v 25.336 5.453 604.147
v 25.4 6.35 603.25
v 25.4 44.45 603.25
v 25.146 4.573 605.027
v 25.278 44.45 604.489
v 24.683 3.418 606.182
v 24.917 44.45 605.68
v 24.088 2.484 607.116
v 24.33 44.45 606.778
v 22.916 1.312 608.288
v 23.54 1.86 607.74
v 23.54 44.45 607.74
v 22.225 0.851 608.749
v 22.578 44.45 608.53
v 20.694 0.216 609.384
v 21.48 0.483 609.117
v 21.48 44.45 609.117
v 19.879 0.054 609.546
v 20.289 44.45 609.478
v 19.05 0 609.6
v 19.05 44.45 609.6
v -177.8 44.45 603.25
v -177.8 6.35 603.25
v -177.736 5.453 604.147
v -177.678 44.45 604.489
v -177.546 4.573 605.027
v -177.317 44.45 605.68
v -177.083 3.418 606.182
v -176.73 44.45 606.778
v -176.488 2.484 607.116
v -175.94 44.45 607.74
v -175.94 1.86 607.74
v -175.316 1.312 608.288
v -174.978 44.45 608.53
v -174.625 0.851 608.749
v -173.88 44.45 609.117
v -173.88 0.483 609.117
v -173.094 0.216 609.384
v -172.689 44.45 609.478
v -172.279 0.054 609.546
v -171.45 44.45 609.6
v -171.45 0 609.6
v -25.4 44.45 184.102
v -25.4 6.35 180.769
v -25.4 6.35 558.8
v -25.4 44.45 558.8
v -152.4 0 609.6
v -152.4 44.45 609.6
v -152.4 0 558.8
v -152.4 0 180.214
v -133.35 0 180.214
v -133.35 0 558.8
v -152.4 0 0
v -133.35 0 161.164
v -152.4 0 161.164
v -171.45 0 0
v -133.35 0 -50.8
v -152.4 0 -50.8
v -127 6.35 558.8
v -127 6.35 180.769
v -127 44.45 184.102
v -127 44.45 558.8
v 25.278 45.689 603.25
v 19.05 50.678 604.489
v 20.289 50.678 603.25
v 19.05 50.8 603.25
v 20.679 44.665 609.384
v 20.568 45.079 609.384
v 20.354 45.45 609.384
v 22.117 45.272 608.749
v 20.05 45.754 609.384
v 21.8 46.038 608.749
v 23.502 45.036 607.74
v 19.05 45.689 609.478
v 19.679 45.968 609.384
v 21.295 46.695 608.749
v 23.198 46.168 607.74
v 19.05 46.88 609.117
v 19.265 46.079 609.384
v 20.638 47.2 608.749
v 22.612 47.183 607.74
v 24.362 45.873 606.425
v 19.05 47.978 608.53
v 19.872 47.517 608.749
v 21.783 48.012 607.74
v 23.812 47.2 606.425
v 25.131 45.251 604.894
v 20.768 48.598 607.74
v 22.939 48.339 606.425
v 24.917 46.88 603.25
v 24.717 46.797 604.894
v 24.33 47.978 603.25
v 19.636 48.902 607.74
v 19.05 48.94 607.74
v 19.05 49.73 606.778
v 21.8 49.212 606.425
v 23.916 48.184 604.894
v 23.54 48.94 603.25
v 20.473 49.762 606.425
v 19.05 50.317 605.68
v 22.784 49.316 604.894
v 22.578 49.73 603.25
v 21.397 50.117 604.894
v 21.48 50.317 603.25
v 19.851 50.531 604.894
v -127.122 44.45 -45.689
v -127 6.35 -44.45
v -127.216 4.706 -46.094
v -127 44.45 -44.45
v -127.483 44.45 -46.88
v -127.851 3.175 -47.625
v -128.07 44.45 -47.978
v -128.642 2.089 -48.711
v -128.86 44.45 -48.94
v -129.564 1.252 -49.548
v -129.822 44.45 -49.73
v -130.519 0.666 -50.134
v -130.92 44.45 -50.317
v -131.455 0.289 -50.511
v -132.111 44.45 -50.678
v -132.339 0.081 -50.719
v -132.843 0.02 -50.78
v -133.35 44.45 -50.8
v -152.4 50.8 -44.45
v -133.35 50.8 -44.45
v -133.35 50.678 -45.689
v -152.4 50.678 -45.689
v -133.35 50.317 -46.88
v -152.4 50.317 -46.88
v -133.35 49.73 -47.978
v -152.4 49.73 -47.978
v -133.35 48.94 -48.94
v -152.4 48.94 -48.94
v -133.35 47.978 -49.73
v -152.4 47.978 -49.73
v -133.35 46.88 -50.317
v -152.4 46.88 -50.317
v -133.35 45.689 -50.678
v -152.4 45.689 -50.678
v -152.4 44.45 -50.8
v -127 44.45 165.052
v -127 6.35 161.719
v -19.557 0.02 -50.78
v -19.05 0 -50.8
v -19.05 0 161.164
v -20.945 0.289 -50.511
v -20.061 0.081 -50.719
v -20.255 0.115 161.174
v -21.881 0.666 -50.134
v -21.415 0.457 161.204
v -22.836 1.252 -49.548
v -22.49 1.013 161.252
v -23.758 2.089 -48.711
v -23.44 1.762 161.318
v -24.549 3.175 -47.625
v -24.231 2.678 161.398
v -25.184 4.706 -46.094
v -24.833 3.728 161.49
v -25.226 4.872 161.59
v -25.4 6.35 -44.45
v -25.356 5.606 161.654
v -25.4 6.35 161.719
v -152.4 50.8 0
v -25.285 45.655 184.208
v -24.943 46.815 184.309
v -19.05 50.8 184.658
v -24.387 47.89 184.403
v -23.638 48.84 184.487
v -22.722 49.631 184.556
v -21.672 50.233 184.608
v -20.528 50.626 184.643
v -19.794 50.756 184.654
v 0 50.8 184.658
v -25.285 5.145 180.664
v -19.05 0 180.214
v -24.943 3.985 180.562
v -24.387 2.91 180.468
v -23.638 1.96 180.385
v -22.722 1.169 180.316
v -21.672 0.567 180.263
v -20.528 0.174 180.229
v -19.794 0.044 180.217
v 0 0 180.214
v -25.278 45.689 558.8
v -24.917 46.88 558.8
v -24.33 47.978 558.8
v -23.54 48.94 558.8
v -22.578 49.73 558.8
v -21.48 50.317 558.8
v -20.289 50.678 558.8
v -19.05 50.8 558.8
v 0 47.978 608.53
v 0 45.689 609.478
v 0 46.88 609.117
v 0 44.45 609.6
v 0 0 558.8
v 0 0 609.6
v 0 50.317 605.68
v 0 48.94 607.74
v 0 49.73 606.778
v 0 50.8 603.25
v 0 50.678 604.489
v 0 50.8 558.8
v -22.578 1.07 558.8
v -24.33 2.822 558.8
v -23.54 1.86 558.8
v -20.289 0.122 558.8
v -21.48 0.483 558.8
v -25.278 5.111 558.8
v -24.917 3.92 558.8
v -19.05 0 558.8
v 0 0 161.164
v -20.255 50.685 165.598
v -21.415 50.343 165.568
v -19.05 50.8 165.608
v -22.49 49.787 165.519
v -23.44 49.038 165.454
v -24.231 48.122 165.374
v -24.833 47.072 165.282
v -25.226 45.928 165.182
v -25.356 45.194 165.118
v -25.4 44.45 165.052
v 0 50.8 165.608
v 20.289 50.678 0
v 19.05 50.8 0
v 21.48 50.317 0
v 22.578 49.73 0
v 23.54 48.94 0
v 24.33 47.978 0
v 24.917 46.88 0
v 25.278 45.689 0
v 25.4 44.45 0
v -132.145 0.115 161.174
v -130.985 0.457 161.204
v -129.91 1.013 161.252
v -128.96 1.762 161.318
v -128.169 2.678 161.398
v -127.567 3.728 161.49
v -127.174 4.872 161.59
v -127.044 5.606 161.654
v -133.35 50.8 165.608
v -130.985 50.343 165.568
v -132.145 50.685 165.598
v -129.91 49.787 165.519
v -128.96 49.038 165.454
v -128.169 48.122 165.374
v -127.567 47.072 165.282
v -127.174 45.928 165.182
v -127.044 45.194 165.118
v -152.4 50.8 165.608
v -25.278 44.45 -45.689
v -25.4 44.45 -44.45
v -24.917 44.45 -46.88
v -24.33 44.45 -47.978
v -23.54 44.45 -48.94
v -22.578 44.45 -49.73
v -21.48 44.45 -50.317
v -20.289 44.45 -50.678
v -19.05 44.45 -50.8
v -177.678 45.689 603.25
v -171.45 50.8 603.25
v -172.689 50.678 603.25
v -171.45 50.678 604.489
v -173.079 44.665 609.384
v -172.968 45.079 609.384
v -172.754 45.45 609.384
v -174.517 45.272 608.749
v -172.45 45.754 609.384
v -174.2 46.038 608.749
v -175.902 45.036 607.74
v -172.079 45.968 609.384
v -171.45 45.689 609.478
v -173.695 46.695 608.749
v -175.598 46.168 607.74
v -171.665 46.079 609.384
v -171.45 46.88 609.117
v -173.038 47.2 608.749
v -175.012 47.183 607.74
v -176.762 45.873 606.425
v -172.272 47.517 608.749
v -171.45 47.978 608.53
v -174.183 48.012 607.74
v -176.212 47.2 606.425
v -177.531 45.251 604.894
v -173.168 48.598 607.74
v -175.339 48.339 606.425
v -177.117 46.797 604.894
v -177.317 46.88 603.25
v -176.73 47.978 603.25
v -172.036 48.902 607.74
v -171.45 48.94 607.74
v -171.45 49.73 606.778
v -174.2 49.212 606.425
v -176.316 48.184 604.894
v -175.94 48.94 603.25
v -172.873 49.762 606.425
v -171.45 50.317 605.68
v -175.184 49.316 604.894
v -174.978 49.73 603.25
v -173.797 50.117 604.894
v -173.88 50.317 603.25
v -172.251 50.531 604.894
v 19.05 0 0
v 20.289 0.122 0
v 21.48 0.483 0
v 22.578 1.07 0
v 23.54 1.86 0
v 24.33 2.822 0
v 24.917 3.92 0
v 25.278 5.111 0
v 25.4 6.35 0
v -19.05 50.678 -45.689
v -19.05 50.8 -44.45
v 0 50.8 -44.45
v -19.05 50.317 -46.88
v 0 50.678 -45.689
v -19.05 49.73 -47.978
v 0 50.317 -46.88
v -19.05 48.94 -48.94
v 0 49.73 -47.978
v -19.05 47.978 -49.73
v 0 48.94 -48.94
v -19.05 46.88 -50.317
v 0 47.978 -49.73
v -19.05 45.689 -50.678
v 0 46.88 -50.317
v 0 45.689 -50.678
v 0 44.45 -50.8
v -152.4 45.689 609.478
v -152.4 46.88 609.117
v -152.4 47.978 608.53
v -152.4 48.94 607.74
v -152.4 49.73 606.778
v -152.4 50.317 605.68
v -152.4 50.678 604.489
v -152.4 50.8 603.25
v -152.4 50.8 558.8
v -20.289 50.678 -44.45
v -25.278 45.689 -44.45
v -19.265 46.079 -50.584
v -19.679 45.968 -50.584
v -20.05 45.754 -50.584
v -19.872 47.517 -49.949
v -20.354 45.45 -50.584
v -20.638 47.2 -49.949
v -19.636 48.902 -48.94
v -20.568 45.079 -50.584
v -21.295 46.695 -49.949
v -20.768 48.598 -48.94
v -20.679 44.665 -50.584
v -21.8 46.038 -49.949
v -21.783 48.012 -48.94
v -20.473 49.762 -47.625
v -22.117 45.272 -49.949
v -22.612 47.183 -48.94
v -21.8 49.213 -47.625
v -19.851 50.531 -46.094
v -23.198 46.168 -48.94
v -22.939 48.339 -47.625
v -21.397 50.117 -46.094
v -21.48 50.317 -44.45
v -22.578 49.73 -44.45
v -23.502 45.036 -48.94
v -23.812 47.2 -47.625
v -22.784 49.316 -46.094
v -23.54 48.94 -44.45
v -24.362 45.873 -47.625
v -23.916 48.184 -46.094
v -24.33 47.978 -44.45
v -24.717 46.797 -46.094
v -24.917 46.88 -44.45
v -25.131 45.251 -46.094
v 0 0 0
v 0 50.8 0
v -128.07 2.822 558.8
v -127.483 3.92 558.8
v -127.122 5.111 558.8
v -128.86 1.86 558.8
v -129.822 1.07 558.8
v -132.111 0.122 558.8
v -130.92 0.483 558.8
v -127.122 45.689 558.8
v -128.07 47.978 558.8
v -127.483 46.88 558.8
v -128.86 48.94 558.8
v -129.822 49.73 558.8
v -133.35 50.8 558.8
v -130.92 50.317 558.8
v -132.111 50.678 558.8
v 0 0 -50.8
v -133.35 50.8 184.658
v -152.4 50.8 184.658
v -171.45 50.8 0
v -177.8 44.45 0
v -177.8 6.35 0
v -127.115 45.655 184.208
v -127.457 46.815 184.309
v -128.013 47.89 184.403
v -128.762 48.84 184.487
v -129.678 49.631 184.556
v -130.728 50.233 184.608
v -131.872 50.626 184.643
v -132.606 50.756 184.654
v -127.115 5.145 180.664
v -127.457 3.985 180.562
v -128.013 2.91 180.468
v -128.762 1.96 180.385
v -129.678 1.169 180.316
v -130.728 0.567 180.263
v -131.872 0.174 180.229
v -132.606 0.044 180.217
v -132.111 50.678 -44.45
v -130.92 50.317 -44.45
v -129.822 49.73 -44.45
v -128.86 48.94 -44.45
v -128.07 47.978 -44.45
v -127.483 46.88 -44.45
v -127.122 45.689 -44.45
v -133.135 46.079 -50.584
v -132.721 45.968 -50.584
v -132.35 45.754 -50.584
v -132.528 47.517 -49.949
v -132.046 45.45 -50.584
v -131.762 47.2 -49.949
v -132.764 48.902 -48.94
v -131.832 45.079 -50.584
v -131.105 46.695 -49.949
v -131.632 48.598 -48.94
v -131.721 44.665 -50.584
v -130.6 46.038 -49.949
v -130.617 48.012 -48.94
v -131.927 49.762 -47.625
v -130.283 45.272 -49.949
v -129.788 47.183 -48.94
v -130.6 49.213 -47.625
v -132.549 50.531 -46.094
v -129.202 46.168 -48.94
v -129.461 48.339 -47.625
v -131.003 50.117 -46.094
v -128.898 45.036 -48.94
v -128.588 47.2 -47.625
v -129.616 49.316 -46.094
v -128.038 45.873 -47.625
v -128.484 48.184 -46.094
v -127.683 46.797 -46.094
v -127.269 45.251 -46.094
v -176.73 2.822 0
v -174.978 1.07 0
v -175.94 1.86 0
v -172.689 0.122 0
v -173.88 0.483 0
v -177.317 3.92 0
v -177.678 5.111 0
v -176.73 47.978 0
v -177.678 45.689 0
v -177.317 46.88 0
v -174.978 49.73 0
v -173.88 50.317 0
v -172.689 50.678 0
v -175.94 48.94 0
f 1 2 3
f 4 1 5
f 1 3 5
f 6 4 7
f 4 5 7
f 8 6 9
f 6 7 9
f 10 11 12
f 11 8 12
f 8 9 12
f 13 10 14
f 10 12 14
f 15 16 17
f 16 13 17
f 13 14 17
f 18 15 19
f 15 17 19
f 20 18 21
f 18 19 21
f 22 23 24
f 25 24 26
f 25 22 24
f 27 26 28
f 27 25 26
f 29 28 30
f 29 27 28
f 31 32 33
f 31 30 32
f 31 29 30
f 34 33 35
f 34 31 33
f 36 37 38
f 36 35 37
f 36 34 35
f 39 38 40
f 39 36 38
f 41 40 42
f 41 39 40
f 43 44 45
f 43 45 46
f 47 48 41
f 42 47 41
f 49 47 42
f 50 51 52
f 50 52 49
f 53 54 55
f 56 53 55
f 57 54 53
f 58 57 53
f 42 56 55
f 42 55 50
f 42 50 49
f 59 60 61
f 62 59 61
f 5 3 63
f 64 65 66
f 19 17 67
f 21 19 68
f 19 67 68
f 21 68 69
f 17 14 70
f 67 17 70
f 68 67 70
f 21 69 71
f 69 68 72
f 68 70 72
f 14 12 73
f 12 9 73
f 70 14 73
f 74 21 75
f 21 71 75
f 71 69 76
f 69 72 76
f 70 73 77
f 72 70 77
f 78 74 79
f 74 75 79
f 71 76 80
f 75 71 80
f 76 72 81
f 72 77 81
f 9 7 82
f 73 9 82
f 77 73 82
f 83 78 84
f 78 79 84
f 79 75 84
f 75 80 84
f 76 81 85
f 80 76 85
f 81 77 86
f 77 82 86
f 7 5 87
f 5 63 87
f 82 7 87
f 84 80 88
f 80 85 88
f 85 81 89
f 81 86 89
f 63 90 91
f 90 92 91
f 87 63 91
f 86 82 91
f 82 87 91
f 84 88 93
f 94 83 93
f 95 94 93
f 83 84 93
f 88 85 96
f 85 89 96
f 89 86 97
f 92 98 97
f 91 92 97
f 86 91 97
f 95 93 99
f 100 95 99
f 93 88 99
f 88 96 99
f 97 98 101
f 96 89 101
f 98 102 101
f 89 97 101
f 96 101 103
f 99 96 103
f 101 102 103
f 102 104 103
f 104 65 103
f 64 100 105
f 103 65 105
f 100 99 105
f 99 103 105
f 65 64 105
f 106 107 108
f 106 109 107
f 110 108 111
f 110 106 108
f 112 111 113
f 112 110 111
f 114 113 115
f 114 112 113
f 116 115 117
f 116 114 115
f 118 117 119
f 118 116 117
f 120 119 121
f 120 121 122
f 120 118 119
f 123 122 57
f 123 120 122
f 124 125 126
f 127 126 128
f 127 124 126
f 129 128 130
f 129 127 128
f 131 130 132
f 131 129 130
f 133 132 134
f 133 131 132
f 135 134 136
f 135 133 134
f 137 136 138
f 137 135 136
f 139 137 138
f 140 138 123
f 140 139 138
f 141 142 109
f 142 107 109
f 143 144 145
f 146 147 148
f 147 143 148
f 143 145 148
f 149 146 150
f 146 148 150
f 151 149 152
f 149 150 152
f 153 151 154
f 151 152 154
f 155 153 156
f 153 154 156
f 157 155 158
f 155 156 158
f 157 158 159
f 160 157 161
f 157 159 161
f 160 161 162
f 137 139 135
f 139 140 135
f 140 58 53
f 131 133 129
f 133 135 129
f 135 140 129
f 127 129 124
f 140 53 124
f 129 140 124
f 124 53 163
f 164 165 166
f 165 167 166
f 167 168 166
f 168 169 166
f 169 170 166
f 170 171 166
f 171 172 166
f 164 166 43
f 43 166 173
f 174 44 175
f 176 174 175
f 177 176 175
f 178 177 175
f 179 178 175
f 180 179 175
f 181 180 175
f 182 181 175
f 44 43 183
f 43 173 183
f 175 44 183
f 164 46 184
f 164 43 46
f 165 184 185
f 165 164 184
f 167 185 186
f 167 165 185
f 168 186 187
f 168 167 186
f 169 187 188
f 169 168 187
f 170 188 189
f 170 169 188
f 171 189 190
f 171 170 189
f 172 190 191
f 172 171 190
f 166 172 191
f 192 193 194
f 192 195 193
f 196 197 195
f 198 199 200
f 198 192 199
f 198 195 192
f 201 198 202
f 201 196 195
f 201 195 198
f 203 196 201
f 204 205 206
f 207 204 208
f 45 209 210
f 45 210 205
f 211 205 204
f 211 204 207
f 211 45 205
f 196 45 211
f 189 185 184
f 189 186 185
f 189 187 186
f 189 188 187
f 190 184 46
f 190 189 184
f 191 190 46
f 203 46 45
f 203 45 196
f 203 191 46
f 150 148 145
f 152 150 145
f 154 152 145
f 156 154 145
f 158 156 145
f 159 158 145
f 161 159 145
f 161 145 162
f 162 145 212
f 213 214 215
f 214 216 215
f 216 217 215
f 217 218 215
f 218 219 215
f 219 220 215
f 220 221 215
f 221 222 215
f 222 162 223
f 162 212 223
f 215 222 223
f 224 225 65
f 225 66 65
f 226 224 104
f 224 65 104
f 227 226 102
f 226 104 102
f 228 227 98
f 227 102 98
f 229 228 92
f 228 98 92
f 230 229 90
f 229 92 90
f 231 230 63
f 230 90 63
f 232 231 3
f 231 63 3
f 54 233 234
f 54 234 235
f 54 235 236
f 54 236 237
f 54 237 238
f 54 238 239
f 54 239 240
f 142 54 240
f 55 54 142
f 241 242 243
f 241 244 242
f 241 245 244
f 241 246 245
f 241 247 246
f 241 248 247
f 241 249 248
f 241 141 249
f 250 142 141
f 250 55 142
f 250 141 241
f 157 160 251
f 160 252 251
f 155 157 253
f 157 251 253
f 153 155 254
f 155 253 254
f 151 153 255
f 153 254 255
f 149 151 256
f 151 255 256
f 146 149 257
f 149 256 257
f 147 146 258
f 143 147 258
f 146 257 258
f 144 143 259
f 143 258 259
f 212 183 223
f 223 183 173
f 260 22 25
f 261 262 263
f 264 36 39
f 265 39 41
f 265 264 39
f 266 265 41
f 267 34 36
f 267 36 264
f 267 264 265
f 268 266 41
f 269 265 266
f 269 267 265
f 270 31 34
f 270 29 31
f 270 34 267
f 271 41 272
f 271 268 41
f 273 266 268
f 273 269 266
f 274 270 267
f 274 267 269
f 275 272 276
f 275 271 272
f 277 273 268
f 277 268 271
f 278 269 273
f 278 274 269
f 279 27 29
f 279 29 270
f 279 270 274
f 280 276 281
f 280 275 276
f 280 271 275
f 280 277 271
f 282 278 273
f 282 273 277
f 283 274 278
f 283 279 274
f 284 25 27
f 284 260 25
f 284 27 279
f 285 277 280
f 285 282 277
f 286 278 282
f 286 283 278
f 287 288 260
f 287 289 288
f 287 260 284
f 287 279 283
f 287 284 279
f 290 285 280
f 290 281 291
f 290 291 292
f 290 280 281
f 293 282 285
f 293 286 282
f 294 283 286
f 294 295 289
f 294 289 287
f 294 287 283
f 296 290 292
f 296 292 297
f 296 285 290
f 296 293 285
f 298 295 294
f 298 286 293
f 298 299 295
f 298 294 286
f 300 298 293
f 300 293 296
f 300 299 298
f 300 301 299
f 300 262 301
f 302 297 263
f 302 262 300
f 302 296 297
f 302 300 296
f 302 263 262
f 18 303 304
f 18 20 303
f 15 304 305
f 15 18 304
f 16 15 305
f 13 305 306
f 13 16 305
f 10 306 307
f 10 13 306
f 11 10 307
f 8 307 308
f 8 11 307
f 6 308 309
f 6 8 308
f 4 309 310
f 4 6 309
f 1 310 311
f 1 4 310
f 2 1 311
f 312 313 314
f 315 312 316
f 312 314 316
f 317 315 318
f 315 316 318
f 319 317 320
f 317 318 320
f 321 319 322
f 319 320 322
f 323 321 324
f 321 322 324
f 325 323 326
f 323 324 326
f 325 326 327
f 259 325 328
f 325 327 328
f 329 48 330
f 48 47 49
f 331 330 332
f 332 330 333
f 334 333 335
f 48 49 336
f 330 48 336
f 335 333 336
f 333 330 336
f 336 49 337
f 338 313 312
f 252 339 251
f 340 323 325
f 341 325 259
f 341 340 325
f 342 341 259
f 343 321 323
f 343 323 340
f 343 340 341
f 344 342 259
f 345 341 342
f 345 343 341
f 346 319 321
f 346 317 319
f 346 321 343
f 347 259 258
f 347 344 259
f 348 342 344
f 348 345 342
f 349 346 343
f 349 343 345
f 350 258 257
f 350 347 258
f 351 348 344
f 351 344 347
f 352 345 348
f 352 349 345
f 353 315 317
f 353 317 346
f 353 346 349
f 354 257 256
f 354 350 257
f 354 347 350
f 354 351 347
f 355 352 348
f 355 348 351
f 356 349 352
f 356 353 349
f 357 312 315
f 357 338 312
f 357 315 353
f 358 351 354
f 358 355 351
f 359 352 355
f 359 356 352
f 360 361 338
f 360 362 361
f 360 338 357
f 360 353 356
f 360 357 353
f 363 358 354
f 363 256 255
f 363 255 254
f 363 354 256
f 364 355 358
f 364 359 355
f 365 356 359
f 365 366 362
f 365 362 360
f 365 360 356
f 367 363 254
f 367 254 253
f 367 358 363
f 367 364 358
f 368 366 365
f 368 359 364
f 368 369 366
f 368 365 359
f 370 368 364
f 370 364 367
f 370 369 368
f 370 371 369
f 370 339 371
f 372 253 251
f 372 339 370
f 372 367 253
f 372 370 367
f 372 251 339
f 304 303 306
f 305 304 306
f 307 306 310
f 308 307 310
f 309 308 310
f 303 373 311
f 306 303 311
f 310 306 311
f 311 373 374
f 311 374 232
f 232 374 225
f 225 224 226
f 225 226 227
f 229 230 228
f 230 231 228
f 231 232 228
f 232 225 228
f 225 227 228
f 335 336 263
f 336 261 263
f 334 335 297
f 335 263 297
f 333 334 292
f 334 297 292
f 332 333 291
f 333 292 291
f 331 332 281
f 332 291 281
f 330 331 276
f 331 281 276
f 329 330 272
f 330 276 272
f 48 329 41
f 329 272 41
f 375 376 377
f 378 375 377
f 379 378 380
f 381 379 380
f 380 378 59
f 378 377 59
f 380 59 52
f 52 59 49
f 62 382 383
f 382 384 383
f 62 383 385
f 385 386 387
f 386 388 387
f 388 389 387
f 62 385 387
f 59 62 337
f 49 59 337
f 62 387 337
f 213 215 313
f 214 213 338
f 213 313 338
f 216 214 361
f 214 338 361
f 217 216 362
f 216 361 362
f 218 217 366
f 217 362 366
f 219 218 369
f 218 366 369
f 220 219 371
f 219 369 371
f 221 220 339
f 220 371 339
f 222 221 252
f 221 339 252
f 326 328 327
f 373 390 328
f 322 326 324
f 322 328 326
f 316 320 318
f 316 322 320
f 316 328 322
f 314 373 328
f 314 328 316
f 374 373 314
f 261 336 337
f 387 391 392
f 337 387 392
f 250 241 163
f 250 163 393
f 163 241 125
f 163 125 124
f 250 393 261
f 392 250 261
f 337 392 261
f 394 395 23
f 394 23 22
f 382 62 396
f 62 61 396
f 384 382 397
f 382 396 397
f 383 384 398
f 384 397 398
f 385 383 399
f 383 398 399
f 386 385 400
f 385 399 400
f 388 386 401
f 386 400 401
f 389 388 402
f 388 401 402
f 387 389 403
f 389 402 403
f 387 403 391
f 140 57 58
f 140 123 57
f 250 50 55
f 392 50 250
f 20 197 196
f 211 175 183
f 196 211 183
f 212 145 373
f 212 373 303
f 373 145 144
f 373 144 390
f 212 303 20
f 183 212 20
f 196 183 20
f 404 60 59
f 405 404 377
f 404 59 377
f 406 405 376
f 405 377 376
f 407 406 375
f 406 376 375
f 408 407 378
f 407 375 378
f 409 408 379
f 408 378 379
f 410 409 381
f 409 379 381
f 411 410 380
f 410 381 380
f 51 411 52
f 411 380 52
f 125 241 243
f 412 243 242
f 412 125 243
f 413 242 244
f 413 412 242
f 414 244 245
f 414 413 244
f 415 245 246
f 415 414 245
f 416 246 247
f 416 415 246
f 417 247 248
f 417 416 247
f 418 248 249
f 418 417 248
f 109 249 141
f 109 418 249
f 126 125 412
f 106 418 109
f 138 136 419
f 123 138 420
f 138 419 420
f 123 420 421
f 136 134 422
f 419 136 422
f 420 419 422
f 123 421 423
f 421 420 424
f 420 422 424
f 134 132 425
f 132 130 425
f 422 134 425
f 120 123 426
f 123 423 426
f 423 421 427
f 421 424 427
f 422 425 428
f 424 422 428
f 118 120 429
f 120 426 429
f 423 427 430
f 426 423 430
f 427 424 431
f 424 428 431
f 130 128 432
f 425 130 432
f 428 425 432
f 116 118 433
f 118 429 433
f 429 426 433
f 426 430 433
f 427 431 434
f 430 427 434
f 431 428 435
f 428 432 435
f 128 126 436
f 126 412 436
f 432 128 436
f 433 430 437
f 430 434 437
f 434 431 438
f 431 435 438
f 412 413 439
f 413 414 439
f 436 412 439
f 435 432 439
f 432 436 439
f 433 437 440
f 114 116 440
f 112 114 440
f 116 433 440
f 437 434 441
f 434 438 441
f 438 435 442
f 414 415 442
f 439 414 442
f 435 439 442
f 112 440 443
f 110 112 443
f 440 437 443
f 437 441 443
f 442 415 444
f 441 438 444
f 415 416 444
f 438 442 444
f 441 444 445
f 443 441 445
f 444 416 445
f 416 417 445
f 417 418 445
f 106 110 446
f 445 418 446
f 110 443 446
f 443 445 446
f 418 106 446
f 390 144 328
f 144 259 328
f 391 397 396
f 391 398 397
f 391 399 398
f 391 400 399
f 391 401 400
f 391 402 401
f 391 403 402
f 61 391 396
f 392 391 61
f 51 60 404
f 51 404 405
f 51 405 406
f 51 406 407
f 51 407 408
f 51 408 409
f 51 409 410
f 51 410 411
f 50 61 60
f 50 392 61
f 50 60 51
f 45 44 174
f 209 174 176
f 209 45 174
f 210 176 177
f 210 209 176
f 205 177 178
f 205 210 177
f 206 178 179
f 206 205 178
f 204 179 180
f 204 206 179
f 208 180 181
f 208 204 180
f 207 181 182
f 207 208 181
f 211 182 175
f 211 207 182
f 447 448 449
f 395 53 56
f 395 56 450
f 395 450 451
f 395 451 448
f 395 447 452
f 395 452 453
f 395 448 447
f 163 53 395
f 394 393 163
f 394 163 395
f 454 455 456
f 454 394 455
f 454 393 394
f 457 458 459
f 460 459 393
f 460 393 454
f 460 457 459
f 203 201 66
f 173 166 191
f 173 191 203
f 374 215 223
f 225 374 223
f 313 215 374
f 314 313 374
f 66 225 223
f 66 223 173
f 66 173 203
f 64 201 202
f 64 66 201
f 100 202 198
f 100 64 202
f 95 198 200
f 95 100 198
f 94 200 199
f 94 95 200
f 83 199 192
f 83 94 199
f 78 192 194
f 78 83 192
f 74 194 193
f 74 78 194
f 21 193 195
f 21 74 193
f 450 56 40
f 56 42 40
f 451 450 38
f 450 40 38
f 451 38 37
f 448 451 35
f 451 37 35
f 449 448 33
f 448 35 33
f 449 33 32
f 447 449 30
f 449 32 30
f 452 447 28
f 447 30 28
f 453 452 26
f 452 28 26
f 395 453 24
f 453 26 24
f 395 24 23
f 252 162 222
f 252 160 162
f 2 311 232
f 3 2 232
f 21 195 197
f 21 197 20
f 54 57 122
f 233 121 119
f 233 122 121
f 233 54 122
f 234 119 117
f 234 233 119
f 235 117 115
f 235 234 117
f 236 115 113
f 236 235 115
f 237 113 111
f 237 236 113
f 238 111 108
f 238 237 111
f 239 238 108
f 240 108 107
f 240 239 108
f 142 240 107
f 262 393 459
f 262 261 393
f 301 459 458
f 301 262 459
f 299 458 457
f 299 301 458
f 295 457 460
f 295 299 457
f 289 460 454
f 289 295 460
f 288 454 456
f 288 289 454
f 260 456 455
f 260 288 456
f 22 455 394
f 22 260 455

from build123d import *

# Parameters (mm, degrees)
F0_W          = 25.4
F0_H          = 50.8
F1_DEPTH      = 609.6
F2_DEPTH      = 50.8
F2_DEPTH_BACK = 558.8
F4_DEPTH      = 25.4
F5_R          = 6.35


with BuildPart() as f1:
    # F0 (on Top) → F1 (new body)
    with BuildSketch(Plane.XY):
        with Locations((12.7, 25.4)):
            Rectangle(F0_W, F0_H)
    extrude(amount=F1_DEPTH)

    # F0 (on Top) → F2 (join, two sides)
    with BuildSketch(Plane.XY) as f2_sk:
        with Locations((-12.7, 25.4)):
            Rectangle(F0_W, F0_H)
    extrude(amount=-F2_DEPTH)
    extrude(f2_sk.sketch, amount=F2_DEPTH_BACK)

    # F3 (on Right) → F4 (cut)
    with BuildSketch(Plane.YZ):
        Polygon((0, 180.2135758929), (0, 161.1635758929), (50.8, 165.608), (50.8, 184.658), align=None)
    extrude(amount=-F4_DEPTH, mode=Mode.SUBTRACT)

    # F5
    f5_edges = [f1.edges().sort_by_distance(p)[0] for p in [
        (-25.4, 50.8, 57.404),
        (-25.4, 50.8, 371.729),
        (-12.7, 50.8, -50.8),
        (-25.4, 25.4, -50.8),
        (-25.4, 0, 369.506788),
        (-25.4, 0, 55.181788),
        (25.4, 0, 304.8),
        (25.4, 50.8, 304.8),
        (25.4, 25.4, 609.6),
        (12.7, 50.8, 609.6),
    ]]
    fillet(f5_edges, radius=F5_R)


with BuildPart() as f7_1:
    # F7: instance of F1
    add(f1.part.mirror(Plane.YZ.offset(-76.2)))


solid = Compound([f1.part, f7_1.part])
